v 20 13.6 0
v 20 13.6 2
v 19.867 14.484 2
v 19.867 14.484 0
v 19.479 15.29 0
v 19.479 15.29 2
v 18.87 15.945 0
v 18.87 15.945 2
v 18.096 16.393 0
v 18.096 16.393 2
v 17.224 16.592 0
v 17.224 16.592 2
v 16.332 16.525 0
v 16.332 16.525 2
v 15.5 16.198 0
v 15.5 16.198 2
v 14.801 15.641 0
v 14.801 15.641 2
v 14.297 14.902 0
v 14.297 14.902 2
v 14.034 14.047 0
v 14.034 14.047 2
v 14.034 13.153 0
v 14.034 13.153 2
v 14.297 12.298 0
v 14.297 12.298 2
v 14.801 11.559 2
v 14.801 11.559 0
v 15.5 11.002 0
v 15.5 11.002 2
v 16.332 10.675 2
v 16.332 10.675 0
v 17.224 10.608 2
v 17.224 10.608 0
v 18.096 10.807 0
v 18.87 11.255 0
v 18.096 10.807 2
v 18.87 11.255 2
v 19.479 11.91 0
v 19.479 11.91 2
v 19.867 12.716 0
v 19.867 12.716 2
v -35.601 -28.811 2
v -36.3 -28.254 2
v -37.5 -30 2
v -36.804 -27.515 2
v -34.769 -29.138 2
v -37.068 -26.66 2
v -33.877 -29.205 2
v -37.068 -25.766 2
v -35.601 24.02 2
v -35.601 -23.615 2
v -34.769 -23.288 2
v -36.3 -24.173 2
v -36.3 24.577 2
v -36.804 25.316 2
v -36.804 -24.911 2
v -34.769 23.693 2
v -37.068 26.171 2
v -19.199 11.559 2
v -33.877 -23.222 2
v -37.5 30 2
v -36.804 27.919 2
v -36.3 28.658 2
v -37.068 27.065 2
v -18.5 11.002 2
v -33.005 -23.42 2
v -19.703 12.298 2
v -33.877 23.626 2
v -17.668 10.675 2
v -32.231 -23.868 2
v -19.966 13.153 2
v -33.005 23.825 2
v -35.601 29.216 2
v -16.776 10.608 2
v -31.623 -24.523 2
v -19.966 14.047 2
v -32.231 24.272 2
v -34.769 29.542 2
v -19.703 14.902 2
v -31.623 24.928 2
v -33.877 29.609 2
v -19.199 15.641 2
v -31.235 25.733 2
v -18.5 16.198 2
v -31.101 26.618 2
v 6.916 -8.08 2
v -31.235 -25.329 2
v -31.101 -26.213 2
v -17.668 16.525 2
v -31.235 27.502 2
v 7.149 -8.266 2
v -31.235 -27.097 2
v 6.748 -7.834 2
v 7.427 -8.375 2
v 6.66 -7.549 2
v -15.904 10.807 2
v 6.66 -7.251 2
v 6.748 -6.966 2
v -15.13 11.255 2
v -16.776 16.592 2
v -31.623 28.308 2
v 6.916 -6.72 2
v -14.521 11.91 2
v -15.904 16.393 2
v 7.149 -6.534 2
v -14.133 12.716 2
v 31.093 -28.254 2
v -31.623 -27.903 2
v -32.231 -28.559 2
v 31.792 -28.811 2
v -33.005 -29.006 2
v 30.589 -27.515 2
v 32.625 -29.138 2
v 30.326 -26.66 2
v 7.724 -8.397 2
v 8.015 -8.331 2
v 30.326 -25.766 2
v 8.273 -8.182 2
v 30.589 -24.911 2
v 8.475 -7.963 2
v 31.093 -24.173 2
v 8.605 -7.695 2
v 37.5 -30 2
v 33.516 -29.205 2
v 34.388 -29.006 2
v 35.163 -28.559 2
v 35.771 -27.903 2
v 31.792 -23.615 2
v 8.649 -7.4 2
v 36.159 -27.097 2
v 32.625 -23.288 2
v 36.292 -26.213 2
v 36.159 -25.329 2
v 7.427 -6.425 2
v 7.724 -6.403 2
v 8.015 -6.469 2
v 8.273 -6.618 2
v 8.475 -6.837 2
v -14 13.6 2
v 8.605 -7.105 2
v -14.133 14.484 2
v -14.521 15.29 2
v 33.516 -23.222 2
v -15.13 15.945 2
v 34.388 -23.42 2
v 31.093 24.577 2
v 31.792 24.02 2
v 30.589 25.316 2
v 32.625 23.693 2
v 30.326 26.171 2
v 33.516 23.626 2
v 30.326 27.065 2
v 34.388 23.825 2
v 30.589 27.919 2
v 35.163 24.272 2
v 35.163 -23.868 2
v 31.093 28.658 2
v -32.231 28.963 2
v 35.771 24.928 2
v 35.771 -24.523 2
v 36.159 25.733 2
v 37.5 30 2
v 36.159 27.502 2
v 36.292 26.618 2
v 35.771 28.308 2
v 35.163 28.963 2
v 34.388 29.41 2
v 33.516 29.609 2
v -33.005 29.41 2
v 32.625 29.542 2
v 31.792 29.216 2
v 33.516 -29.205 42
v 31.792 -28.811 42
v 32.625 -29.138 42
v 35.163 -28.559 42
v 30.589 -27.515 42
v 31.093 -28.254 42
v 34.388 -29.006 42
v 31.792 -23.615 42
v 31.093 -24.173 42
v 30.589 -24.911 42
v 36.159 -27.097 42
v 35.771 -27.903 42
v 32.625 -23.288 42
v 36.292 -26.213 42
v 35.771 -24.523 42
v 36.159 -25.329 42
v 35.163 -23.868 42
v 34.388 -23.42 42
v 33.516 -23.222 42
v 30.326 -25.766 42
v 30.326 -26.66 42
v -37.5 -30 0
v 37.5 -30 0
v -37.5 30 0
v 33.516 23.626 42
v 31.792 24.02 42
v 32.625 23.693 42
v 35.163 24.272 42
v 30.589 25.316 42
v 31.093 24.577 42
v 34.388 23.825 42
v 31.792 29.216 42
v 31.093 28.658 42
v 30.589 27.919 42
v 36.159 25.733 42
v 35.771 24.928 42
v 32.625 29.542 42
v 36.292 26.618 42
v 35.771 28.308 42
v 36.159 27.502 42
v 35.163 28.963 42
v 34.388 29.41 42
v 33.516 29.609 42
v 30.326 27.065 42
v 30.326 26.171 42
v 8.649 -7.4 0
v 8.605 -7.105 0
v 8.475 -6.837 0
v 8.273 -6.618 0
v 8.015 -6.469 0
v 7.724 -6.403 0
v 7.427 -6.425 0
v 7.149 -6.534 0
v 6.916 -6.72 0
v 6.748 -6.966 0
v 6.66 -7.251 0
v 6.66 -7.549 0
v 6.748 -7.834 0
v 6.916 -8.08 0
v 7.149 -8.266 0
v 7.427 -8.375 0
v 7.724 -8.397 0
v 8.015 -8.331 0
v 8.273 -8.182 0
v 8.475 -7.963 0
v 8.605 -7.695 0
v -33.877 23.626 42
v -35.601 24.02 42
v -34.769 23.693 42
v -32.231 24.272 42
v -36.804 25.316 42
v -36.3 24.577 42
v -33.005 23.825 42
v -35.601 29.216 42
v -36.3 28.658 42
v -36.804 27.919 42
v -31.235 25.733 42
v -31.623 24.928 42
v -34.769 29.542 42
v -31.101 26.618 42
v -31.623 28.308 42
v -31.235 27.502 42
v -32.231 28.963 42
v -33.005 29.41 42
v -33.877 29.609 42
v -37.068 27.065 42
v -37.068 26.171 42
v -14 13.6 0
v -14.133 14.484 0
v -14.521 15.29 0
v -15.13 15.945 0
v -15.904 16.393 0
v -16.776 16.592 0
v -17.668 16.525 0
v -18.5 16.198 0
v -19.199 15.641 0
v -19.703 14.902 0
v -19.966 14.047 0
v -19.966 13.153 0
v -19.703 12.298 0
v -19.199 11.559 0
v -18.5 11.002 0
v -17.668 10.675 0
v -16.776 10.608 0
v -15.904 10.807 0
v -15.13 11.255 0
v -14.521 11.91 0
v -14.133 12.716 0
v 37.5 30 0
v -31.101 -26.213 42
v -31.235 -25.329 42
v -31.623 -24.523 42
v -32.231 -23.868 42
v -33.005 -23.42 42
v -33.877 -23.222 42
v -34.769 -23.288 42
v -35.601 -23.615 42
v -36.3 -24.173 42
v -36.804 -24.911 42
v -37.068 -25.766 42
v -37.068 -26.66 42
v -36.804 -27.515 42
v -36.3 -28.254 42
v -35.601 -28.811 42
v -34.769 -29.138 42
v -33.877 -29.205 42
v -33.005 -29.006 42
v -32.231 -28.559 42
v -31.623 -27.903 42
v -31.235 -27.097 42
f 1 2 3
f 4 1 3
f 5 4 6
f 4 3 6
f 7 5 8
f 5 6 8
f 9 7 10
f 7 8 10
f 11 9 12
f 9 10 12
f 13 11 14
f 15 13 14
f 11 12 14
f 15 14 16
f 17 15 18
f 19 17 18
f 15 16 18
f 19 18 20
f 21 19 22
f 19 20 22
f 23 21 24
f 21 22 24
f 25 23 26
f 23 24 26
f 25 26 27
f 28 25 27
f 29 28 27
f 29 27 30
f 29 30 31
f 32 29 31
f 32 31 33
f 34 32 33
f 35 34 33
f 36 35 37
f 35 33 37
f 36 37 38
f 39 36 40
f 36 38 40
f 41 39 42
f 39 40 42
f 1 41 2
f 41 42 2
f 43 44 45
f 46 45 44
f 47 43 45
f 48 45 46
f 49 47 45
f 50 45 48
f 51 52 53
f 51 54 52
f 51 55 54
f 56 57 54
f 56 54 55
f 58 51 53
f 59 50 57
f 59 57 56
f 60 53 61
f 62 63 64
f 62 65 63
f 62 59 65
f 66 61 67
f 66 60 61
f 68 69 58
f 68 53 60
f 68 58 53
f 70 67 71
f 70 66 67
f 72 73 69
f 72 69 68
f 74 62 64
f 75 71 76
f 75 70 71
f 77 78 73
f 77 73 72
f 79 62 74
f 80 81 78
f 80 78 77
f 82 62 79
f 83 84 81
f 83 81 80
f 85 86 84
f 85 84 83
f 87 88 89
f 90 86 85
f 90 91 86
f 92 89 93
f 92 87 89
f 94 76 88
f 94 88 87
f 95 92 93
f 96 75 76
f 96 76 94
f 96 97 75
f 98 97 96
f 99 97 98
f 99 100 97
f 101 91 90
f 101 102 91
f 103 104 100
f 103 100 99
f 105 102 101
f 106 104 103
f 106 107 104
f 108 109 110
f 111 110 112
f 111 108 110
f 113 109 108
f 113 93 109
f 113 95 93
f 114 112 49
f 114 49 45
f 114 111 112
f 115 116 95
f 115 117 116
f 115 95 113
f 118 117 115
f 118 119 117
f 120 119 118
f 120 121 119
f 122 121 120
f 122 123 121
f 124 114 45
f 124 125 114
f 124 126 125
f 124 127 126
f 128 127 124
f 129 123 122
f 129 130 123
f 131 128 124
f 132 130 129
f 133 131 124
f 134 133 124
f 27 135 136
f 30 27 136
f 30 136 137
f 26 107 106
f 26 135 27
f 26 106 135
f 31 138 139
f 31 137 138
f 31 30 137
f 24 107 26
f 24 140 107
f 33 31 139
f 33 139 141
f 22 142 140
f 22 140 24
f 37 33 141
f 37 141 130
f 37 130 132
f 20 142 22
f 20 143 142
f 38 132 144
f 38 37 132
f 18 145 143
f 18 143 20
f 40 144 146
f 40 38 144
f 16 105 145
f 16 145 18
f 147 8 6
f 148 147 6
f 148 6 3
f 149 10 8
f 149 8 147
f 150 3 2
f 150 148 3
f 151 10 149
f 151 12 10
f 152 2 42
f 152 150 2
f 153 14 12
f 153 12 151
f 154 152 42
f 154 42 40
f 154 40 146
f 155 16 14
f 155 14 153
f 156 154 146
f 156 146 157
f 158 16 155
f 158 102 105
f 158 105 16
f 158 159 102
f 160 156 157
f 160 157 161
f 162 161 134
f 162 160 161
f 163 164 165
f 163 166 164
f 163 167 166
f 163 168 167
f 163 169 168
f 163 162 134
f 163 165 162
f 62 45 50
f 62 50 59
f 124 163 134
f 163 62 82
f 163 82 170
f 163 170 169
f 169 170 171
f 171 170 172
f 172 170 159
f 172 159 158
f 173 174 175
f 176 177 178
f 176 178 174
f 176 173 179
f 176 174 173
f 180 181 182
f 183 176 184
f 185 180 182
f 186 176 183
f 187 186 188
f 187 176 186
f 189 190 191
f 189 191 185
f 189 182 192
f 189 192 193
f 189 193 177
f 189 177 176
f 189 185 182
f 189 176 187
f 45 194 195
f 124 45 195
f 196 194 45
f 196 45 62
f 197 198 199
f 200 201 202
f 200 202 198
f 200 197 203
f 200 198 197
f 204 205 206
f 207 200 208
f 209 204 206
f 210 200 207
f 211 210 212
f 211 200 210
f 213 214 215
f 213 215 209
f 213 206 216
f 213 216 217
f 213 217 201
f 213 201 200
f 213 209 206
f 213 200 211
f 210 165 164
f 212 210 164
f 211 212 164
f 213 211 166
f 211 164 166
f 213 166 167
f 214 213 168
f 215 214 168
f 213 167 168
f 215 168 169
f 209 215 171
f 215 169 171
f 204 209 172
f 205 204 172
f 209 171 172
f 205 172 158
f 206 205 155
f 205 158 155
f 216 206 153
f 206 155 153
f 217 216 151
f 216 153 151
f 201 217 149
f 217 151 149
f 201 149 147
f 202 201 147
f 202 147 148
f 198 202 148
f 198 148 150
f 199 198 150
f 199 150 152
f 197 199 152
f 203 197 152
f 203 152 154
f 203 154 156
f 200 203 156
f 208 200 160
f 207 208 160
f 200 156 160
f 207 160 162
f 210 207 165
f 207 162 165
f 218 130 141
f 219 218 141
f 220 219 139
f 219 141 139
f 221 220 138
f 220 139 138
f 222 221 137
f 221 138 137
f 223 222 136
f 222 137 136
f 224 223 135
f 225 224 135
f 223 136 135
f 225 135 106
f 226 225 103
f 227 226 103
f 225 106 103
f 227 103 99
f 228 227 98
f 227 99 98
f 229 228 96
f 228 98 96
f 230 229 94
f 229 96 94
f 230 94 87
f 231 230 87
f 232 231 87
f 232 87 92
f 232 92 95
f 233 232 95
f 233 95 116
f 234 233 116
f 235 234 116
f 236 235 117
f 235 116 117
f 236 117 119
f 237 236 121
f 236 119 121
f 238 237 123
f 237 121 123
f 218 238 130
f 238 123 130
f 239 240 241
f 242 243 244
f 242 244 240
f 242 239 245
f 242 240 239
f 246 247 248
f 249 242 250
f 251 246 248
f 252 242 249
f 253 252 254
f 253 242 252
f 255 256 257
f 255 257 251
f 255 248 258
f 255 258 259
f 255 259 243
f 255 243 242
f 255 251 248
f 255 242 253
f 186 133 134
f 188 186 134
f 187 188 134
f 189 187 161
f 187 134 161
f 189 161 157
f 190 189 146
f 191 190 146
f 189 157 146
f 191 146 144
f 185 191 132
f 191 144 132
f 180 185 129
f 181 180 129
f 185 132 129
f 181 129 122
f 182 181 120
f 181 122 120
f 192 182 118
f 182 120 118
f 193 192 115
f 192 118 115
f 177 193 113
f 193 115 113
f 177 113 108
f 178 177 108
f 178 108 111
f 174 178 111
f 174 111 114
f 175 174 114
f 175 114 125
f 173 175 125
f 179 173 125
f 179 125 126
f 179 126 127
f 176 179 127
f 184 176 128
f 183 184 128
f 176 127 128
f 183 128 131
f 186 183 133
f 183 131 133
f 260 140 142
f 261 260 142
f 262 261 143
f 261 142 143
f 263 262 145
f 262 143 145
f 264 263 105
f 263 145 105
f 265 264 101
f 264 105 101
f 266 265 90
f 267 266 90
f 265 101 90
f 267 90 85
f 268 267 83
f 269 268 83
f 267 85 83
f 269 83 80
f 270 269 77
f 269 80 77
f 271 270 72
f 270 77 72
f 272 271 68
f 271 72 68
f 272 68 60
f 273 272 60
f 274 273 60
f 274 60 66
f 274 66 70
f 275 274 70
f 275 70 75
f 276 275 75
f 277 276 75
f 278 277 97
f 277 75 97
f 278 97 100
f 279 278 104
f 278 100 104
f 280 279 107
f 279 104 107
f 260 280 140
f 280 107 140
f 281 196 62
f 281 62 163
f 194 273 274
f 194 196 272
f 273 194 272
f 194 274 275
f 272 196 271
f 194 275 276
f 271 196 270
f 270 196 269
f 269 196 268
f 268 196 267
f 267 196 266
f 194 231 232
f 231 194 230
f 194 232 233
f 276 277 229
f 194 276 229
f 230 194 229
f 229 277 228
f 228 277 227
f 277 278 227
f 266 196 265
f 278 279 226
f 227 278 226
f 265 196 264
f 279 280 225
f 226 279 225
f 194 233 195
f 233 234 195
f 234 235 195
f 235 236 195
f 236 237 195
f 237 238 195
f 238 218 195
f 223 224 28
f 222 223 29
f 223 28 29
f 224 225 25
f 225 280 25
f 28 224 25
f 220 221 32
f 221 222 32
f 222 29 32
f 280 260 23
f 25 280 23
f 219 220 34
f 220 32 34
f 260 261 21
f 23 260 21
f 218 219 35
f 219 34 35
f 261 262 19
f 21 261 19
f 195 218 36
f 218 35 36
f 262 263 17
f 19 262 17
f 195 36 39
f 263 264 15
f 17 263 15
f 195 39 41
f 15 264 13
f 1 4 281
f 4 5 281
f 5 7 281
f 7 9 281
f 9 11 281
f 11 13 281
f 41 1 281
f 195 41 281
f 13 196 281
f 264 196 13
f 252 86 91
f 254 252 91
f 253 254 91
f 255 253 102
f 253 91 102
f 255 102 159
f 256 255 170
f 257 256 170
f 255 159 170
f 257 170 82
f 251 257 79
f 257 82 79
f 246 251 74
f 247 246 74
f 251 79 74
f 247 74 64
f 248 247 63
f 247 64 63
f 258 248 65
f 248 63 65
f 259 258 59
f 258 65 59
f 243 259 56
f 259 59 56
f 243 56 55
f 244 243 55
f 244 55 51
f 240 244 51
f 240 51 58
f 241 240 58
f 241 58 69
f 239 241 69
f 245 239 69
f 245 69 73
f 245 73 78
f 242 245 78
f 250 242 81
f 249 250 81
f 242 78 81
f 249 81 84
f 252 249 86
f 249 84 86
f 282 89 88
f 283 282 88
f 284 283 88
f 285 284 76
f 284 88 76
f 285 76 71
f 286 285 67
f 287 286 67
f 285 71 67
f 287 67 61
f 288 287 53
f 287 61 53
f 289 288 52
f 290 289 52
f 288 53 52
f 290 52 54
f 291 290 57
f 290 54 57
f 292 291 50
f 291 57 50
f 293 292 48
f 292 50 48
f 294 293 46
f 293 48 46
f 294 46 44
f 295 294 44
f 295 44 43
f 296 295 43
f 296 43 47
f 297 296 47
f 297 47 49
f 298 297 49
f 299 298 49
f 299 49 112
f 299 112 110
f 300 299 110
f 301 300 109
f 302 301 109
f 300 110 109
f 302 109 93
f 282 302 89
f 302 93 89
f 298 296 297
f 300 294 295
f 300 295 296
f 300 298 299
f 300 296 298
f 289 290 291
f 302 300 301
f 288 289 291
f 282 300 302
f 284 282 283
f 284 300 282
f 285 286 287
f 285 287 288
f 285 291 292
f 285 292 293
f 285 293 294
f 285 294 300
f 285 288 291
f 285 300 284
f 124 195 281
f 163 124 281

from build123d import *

# Parameters (mm, degrees)
ESQUISSE3_W             = 75
ESQUISSE3_H             = 60
BOSS_EXTRU_4_DEPTH      = 2
ESQUISSE7_R             = 3
ESQUISSE7_R_2           = 1
ENL_V_MAT_EXTRU_1_DEPTH = 2
ESQUISSE9_R             = 3
BOSS_EXTRU_5_DEPTH      = 40


with BuildPart() as part:
    # Esquisse3 → Boss.-Extru.4 (new body)
    with BuildSketch(Plane.XY):
        Rectangle(ESQUISSE3_W, ESQUISSE3_H)
    extrude(amount=BOSS_EXTRU_4_DEPTH)

    # Esquisse7 → Enlèv. mat.-Extru.1 (cut)
    with BuildSketch(Plane.XY.offset(2)):
        with Locations((-17, 13.6)):
            Circle(ESQUISSE7_R)
        with Locations((17, 13.6)):
            Circle(ESQUISSE7_R)
        with Locations((7.649218941, -7.4)):
            Circle(ESQUISSE7_R_2)
    extrude(amount=-ENL_V_MAT_EXTRU_1_DEPTH, mode=Mode.SUBTRACT)

    # Esquisse9 → Boss.-Extru.5 (add)
    with BuildSketch(Plane.XY.offset(2)):
        with Locations((-34.10132307, 26.617640071)):
            Circle(ESQUISSE9_R)
        with Locations((33.292276259, 26.617640071)):
            Circle(ESQUISSE9_R)
        with Locations((33.292276259, -26.213116666)):
            Circle(ESQUISSE9_R)
        with Locations((-34.10132307, -26.213116666)):
            Circle(ESQUISSE9_R)
    extrude(amount=BOSS_EXTRU_5_DEPTH)


solid = part.part
